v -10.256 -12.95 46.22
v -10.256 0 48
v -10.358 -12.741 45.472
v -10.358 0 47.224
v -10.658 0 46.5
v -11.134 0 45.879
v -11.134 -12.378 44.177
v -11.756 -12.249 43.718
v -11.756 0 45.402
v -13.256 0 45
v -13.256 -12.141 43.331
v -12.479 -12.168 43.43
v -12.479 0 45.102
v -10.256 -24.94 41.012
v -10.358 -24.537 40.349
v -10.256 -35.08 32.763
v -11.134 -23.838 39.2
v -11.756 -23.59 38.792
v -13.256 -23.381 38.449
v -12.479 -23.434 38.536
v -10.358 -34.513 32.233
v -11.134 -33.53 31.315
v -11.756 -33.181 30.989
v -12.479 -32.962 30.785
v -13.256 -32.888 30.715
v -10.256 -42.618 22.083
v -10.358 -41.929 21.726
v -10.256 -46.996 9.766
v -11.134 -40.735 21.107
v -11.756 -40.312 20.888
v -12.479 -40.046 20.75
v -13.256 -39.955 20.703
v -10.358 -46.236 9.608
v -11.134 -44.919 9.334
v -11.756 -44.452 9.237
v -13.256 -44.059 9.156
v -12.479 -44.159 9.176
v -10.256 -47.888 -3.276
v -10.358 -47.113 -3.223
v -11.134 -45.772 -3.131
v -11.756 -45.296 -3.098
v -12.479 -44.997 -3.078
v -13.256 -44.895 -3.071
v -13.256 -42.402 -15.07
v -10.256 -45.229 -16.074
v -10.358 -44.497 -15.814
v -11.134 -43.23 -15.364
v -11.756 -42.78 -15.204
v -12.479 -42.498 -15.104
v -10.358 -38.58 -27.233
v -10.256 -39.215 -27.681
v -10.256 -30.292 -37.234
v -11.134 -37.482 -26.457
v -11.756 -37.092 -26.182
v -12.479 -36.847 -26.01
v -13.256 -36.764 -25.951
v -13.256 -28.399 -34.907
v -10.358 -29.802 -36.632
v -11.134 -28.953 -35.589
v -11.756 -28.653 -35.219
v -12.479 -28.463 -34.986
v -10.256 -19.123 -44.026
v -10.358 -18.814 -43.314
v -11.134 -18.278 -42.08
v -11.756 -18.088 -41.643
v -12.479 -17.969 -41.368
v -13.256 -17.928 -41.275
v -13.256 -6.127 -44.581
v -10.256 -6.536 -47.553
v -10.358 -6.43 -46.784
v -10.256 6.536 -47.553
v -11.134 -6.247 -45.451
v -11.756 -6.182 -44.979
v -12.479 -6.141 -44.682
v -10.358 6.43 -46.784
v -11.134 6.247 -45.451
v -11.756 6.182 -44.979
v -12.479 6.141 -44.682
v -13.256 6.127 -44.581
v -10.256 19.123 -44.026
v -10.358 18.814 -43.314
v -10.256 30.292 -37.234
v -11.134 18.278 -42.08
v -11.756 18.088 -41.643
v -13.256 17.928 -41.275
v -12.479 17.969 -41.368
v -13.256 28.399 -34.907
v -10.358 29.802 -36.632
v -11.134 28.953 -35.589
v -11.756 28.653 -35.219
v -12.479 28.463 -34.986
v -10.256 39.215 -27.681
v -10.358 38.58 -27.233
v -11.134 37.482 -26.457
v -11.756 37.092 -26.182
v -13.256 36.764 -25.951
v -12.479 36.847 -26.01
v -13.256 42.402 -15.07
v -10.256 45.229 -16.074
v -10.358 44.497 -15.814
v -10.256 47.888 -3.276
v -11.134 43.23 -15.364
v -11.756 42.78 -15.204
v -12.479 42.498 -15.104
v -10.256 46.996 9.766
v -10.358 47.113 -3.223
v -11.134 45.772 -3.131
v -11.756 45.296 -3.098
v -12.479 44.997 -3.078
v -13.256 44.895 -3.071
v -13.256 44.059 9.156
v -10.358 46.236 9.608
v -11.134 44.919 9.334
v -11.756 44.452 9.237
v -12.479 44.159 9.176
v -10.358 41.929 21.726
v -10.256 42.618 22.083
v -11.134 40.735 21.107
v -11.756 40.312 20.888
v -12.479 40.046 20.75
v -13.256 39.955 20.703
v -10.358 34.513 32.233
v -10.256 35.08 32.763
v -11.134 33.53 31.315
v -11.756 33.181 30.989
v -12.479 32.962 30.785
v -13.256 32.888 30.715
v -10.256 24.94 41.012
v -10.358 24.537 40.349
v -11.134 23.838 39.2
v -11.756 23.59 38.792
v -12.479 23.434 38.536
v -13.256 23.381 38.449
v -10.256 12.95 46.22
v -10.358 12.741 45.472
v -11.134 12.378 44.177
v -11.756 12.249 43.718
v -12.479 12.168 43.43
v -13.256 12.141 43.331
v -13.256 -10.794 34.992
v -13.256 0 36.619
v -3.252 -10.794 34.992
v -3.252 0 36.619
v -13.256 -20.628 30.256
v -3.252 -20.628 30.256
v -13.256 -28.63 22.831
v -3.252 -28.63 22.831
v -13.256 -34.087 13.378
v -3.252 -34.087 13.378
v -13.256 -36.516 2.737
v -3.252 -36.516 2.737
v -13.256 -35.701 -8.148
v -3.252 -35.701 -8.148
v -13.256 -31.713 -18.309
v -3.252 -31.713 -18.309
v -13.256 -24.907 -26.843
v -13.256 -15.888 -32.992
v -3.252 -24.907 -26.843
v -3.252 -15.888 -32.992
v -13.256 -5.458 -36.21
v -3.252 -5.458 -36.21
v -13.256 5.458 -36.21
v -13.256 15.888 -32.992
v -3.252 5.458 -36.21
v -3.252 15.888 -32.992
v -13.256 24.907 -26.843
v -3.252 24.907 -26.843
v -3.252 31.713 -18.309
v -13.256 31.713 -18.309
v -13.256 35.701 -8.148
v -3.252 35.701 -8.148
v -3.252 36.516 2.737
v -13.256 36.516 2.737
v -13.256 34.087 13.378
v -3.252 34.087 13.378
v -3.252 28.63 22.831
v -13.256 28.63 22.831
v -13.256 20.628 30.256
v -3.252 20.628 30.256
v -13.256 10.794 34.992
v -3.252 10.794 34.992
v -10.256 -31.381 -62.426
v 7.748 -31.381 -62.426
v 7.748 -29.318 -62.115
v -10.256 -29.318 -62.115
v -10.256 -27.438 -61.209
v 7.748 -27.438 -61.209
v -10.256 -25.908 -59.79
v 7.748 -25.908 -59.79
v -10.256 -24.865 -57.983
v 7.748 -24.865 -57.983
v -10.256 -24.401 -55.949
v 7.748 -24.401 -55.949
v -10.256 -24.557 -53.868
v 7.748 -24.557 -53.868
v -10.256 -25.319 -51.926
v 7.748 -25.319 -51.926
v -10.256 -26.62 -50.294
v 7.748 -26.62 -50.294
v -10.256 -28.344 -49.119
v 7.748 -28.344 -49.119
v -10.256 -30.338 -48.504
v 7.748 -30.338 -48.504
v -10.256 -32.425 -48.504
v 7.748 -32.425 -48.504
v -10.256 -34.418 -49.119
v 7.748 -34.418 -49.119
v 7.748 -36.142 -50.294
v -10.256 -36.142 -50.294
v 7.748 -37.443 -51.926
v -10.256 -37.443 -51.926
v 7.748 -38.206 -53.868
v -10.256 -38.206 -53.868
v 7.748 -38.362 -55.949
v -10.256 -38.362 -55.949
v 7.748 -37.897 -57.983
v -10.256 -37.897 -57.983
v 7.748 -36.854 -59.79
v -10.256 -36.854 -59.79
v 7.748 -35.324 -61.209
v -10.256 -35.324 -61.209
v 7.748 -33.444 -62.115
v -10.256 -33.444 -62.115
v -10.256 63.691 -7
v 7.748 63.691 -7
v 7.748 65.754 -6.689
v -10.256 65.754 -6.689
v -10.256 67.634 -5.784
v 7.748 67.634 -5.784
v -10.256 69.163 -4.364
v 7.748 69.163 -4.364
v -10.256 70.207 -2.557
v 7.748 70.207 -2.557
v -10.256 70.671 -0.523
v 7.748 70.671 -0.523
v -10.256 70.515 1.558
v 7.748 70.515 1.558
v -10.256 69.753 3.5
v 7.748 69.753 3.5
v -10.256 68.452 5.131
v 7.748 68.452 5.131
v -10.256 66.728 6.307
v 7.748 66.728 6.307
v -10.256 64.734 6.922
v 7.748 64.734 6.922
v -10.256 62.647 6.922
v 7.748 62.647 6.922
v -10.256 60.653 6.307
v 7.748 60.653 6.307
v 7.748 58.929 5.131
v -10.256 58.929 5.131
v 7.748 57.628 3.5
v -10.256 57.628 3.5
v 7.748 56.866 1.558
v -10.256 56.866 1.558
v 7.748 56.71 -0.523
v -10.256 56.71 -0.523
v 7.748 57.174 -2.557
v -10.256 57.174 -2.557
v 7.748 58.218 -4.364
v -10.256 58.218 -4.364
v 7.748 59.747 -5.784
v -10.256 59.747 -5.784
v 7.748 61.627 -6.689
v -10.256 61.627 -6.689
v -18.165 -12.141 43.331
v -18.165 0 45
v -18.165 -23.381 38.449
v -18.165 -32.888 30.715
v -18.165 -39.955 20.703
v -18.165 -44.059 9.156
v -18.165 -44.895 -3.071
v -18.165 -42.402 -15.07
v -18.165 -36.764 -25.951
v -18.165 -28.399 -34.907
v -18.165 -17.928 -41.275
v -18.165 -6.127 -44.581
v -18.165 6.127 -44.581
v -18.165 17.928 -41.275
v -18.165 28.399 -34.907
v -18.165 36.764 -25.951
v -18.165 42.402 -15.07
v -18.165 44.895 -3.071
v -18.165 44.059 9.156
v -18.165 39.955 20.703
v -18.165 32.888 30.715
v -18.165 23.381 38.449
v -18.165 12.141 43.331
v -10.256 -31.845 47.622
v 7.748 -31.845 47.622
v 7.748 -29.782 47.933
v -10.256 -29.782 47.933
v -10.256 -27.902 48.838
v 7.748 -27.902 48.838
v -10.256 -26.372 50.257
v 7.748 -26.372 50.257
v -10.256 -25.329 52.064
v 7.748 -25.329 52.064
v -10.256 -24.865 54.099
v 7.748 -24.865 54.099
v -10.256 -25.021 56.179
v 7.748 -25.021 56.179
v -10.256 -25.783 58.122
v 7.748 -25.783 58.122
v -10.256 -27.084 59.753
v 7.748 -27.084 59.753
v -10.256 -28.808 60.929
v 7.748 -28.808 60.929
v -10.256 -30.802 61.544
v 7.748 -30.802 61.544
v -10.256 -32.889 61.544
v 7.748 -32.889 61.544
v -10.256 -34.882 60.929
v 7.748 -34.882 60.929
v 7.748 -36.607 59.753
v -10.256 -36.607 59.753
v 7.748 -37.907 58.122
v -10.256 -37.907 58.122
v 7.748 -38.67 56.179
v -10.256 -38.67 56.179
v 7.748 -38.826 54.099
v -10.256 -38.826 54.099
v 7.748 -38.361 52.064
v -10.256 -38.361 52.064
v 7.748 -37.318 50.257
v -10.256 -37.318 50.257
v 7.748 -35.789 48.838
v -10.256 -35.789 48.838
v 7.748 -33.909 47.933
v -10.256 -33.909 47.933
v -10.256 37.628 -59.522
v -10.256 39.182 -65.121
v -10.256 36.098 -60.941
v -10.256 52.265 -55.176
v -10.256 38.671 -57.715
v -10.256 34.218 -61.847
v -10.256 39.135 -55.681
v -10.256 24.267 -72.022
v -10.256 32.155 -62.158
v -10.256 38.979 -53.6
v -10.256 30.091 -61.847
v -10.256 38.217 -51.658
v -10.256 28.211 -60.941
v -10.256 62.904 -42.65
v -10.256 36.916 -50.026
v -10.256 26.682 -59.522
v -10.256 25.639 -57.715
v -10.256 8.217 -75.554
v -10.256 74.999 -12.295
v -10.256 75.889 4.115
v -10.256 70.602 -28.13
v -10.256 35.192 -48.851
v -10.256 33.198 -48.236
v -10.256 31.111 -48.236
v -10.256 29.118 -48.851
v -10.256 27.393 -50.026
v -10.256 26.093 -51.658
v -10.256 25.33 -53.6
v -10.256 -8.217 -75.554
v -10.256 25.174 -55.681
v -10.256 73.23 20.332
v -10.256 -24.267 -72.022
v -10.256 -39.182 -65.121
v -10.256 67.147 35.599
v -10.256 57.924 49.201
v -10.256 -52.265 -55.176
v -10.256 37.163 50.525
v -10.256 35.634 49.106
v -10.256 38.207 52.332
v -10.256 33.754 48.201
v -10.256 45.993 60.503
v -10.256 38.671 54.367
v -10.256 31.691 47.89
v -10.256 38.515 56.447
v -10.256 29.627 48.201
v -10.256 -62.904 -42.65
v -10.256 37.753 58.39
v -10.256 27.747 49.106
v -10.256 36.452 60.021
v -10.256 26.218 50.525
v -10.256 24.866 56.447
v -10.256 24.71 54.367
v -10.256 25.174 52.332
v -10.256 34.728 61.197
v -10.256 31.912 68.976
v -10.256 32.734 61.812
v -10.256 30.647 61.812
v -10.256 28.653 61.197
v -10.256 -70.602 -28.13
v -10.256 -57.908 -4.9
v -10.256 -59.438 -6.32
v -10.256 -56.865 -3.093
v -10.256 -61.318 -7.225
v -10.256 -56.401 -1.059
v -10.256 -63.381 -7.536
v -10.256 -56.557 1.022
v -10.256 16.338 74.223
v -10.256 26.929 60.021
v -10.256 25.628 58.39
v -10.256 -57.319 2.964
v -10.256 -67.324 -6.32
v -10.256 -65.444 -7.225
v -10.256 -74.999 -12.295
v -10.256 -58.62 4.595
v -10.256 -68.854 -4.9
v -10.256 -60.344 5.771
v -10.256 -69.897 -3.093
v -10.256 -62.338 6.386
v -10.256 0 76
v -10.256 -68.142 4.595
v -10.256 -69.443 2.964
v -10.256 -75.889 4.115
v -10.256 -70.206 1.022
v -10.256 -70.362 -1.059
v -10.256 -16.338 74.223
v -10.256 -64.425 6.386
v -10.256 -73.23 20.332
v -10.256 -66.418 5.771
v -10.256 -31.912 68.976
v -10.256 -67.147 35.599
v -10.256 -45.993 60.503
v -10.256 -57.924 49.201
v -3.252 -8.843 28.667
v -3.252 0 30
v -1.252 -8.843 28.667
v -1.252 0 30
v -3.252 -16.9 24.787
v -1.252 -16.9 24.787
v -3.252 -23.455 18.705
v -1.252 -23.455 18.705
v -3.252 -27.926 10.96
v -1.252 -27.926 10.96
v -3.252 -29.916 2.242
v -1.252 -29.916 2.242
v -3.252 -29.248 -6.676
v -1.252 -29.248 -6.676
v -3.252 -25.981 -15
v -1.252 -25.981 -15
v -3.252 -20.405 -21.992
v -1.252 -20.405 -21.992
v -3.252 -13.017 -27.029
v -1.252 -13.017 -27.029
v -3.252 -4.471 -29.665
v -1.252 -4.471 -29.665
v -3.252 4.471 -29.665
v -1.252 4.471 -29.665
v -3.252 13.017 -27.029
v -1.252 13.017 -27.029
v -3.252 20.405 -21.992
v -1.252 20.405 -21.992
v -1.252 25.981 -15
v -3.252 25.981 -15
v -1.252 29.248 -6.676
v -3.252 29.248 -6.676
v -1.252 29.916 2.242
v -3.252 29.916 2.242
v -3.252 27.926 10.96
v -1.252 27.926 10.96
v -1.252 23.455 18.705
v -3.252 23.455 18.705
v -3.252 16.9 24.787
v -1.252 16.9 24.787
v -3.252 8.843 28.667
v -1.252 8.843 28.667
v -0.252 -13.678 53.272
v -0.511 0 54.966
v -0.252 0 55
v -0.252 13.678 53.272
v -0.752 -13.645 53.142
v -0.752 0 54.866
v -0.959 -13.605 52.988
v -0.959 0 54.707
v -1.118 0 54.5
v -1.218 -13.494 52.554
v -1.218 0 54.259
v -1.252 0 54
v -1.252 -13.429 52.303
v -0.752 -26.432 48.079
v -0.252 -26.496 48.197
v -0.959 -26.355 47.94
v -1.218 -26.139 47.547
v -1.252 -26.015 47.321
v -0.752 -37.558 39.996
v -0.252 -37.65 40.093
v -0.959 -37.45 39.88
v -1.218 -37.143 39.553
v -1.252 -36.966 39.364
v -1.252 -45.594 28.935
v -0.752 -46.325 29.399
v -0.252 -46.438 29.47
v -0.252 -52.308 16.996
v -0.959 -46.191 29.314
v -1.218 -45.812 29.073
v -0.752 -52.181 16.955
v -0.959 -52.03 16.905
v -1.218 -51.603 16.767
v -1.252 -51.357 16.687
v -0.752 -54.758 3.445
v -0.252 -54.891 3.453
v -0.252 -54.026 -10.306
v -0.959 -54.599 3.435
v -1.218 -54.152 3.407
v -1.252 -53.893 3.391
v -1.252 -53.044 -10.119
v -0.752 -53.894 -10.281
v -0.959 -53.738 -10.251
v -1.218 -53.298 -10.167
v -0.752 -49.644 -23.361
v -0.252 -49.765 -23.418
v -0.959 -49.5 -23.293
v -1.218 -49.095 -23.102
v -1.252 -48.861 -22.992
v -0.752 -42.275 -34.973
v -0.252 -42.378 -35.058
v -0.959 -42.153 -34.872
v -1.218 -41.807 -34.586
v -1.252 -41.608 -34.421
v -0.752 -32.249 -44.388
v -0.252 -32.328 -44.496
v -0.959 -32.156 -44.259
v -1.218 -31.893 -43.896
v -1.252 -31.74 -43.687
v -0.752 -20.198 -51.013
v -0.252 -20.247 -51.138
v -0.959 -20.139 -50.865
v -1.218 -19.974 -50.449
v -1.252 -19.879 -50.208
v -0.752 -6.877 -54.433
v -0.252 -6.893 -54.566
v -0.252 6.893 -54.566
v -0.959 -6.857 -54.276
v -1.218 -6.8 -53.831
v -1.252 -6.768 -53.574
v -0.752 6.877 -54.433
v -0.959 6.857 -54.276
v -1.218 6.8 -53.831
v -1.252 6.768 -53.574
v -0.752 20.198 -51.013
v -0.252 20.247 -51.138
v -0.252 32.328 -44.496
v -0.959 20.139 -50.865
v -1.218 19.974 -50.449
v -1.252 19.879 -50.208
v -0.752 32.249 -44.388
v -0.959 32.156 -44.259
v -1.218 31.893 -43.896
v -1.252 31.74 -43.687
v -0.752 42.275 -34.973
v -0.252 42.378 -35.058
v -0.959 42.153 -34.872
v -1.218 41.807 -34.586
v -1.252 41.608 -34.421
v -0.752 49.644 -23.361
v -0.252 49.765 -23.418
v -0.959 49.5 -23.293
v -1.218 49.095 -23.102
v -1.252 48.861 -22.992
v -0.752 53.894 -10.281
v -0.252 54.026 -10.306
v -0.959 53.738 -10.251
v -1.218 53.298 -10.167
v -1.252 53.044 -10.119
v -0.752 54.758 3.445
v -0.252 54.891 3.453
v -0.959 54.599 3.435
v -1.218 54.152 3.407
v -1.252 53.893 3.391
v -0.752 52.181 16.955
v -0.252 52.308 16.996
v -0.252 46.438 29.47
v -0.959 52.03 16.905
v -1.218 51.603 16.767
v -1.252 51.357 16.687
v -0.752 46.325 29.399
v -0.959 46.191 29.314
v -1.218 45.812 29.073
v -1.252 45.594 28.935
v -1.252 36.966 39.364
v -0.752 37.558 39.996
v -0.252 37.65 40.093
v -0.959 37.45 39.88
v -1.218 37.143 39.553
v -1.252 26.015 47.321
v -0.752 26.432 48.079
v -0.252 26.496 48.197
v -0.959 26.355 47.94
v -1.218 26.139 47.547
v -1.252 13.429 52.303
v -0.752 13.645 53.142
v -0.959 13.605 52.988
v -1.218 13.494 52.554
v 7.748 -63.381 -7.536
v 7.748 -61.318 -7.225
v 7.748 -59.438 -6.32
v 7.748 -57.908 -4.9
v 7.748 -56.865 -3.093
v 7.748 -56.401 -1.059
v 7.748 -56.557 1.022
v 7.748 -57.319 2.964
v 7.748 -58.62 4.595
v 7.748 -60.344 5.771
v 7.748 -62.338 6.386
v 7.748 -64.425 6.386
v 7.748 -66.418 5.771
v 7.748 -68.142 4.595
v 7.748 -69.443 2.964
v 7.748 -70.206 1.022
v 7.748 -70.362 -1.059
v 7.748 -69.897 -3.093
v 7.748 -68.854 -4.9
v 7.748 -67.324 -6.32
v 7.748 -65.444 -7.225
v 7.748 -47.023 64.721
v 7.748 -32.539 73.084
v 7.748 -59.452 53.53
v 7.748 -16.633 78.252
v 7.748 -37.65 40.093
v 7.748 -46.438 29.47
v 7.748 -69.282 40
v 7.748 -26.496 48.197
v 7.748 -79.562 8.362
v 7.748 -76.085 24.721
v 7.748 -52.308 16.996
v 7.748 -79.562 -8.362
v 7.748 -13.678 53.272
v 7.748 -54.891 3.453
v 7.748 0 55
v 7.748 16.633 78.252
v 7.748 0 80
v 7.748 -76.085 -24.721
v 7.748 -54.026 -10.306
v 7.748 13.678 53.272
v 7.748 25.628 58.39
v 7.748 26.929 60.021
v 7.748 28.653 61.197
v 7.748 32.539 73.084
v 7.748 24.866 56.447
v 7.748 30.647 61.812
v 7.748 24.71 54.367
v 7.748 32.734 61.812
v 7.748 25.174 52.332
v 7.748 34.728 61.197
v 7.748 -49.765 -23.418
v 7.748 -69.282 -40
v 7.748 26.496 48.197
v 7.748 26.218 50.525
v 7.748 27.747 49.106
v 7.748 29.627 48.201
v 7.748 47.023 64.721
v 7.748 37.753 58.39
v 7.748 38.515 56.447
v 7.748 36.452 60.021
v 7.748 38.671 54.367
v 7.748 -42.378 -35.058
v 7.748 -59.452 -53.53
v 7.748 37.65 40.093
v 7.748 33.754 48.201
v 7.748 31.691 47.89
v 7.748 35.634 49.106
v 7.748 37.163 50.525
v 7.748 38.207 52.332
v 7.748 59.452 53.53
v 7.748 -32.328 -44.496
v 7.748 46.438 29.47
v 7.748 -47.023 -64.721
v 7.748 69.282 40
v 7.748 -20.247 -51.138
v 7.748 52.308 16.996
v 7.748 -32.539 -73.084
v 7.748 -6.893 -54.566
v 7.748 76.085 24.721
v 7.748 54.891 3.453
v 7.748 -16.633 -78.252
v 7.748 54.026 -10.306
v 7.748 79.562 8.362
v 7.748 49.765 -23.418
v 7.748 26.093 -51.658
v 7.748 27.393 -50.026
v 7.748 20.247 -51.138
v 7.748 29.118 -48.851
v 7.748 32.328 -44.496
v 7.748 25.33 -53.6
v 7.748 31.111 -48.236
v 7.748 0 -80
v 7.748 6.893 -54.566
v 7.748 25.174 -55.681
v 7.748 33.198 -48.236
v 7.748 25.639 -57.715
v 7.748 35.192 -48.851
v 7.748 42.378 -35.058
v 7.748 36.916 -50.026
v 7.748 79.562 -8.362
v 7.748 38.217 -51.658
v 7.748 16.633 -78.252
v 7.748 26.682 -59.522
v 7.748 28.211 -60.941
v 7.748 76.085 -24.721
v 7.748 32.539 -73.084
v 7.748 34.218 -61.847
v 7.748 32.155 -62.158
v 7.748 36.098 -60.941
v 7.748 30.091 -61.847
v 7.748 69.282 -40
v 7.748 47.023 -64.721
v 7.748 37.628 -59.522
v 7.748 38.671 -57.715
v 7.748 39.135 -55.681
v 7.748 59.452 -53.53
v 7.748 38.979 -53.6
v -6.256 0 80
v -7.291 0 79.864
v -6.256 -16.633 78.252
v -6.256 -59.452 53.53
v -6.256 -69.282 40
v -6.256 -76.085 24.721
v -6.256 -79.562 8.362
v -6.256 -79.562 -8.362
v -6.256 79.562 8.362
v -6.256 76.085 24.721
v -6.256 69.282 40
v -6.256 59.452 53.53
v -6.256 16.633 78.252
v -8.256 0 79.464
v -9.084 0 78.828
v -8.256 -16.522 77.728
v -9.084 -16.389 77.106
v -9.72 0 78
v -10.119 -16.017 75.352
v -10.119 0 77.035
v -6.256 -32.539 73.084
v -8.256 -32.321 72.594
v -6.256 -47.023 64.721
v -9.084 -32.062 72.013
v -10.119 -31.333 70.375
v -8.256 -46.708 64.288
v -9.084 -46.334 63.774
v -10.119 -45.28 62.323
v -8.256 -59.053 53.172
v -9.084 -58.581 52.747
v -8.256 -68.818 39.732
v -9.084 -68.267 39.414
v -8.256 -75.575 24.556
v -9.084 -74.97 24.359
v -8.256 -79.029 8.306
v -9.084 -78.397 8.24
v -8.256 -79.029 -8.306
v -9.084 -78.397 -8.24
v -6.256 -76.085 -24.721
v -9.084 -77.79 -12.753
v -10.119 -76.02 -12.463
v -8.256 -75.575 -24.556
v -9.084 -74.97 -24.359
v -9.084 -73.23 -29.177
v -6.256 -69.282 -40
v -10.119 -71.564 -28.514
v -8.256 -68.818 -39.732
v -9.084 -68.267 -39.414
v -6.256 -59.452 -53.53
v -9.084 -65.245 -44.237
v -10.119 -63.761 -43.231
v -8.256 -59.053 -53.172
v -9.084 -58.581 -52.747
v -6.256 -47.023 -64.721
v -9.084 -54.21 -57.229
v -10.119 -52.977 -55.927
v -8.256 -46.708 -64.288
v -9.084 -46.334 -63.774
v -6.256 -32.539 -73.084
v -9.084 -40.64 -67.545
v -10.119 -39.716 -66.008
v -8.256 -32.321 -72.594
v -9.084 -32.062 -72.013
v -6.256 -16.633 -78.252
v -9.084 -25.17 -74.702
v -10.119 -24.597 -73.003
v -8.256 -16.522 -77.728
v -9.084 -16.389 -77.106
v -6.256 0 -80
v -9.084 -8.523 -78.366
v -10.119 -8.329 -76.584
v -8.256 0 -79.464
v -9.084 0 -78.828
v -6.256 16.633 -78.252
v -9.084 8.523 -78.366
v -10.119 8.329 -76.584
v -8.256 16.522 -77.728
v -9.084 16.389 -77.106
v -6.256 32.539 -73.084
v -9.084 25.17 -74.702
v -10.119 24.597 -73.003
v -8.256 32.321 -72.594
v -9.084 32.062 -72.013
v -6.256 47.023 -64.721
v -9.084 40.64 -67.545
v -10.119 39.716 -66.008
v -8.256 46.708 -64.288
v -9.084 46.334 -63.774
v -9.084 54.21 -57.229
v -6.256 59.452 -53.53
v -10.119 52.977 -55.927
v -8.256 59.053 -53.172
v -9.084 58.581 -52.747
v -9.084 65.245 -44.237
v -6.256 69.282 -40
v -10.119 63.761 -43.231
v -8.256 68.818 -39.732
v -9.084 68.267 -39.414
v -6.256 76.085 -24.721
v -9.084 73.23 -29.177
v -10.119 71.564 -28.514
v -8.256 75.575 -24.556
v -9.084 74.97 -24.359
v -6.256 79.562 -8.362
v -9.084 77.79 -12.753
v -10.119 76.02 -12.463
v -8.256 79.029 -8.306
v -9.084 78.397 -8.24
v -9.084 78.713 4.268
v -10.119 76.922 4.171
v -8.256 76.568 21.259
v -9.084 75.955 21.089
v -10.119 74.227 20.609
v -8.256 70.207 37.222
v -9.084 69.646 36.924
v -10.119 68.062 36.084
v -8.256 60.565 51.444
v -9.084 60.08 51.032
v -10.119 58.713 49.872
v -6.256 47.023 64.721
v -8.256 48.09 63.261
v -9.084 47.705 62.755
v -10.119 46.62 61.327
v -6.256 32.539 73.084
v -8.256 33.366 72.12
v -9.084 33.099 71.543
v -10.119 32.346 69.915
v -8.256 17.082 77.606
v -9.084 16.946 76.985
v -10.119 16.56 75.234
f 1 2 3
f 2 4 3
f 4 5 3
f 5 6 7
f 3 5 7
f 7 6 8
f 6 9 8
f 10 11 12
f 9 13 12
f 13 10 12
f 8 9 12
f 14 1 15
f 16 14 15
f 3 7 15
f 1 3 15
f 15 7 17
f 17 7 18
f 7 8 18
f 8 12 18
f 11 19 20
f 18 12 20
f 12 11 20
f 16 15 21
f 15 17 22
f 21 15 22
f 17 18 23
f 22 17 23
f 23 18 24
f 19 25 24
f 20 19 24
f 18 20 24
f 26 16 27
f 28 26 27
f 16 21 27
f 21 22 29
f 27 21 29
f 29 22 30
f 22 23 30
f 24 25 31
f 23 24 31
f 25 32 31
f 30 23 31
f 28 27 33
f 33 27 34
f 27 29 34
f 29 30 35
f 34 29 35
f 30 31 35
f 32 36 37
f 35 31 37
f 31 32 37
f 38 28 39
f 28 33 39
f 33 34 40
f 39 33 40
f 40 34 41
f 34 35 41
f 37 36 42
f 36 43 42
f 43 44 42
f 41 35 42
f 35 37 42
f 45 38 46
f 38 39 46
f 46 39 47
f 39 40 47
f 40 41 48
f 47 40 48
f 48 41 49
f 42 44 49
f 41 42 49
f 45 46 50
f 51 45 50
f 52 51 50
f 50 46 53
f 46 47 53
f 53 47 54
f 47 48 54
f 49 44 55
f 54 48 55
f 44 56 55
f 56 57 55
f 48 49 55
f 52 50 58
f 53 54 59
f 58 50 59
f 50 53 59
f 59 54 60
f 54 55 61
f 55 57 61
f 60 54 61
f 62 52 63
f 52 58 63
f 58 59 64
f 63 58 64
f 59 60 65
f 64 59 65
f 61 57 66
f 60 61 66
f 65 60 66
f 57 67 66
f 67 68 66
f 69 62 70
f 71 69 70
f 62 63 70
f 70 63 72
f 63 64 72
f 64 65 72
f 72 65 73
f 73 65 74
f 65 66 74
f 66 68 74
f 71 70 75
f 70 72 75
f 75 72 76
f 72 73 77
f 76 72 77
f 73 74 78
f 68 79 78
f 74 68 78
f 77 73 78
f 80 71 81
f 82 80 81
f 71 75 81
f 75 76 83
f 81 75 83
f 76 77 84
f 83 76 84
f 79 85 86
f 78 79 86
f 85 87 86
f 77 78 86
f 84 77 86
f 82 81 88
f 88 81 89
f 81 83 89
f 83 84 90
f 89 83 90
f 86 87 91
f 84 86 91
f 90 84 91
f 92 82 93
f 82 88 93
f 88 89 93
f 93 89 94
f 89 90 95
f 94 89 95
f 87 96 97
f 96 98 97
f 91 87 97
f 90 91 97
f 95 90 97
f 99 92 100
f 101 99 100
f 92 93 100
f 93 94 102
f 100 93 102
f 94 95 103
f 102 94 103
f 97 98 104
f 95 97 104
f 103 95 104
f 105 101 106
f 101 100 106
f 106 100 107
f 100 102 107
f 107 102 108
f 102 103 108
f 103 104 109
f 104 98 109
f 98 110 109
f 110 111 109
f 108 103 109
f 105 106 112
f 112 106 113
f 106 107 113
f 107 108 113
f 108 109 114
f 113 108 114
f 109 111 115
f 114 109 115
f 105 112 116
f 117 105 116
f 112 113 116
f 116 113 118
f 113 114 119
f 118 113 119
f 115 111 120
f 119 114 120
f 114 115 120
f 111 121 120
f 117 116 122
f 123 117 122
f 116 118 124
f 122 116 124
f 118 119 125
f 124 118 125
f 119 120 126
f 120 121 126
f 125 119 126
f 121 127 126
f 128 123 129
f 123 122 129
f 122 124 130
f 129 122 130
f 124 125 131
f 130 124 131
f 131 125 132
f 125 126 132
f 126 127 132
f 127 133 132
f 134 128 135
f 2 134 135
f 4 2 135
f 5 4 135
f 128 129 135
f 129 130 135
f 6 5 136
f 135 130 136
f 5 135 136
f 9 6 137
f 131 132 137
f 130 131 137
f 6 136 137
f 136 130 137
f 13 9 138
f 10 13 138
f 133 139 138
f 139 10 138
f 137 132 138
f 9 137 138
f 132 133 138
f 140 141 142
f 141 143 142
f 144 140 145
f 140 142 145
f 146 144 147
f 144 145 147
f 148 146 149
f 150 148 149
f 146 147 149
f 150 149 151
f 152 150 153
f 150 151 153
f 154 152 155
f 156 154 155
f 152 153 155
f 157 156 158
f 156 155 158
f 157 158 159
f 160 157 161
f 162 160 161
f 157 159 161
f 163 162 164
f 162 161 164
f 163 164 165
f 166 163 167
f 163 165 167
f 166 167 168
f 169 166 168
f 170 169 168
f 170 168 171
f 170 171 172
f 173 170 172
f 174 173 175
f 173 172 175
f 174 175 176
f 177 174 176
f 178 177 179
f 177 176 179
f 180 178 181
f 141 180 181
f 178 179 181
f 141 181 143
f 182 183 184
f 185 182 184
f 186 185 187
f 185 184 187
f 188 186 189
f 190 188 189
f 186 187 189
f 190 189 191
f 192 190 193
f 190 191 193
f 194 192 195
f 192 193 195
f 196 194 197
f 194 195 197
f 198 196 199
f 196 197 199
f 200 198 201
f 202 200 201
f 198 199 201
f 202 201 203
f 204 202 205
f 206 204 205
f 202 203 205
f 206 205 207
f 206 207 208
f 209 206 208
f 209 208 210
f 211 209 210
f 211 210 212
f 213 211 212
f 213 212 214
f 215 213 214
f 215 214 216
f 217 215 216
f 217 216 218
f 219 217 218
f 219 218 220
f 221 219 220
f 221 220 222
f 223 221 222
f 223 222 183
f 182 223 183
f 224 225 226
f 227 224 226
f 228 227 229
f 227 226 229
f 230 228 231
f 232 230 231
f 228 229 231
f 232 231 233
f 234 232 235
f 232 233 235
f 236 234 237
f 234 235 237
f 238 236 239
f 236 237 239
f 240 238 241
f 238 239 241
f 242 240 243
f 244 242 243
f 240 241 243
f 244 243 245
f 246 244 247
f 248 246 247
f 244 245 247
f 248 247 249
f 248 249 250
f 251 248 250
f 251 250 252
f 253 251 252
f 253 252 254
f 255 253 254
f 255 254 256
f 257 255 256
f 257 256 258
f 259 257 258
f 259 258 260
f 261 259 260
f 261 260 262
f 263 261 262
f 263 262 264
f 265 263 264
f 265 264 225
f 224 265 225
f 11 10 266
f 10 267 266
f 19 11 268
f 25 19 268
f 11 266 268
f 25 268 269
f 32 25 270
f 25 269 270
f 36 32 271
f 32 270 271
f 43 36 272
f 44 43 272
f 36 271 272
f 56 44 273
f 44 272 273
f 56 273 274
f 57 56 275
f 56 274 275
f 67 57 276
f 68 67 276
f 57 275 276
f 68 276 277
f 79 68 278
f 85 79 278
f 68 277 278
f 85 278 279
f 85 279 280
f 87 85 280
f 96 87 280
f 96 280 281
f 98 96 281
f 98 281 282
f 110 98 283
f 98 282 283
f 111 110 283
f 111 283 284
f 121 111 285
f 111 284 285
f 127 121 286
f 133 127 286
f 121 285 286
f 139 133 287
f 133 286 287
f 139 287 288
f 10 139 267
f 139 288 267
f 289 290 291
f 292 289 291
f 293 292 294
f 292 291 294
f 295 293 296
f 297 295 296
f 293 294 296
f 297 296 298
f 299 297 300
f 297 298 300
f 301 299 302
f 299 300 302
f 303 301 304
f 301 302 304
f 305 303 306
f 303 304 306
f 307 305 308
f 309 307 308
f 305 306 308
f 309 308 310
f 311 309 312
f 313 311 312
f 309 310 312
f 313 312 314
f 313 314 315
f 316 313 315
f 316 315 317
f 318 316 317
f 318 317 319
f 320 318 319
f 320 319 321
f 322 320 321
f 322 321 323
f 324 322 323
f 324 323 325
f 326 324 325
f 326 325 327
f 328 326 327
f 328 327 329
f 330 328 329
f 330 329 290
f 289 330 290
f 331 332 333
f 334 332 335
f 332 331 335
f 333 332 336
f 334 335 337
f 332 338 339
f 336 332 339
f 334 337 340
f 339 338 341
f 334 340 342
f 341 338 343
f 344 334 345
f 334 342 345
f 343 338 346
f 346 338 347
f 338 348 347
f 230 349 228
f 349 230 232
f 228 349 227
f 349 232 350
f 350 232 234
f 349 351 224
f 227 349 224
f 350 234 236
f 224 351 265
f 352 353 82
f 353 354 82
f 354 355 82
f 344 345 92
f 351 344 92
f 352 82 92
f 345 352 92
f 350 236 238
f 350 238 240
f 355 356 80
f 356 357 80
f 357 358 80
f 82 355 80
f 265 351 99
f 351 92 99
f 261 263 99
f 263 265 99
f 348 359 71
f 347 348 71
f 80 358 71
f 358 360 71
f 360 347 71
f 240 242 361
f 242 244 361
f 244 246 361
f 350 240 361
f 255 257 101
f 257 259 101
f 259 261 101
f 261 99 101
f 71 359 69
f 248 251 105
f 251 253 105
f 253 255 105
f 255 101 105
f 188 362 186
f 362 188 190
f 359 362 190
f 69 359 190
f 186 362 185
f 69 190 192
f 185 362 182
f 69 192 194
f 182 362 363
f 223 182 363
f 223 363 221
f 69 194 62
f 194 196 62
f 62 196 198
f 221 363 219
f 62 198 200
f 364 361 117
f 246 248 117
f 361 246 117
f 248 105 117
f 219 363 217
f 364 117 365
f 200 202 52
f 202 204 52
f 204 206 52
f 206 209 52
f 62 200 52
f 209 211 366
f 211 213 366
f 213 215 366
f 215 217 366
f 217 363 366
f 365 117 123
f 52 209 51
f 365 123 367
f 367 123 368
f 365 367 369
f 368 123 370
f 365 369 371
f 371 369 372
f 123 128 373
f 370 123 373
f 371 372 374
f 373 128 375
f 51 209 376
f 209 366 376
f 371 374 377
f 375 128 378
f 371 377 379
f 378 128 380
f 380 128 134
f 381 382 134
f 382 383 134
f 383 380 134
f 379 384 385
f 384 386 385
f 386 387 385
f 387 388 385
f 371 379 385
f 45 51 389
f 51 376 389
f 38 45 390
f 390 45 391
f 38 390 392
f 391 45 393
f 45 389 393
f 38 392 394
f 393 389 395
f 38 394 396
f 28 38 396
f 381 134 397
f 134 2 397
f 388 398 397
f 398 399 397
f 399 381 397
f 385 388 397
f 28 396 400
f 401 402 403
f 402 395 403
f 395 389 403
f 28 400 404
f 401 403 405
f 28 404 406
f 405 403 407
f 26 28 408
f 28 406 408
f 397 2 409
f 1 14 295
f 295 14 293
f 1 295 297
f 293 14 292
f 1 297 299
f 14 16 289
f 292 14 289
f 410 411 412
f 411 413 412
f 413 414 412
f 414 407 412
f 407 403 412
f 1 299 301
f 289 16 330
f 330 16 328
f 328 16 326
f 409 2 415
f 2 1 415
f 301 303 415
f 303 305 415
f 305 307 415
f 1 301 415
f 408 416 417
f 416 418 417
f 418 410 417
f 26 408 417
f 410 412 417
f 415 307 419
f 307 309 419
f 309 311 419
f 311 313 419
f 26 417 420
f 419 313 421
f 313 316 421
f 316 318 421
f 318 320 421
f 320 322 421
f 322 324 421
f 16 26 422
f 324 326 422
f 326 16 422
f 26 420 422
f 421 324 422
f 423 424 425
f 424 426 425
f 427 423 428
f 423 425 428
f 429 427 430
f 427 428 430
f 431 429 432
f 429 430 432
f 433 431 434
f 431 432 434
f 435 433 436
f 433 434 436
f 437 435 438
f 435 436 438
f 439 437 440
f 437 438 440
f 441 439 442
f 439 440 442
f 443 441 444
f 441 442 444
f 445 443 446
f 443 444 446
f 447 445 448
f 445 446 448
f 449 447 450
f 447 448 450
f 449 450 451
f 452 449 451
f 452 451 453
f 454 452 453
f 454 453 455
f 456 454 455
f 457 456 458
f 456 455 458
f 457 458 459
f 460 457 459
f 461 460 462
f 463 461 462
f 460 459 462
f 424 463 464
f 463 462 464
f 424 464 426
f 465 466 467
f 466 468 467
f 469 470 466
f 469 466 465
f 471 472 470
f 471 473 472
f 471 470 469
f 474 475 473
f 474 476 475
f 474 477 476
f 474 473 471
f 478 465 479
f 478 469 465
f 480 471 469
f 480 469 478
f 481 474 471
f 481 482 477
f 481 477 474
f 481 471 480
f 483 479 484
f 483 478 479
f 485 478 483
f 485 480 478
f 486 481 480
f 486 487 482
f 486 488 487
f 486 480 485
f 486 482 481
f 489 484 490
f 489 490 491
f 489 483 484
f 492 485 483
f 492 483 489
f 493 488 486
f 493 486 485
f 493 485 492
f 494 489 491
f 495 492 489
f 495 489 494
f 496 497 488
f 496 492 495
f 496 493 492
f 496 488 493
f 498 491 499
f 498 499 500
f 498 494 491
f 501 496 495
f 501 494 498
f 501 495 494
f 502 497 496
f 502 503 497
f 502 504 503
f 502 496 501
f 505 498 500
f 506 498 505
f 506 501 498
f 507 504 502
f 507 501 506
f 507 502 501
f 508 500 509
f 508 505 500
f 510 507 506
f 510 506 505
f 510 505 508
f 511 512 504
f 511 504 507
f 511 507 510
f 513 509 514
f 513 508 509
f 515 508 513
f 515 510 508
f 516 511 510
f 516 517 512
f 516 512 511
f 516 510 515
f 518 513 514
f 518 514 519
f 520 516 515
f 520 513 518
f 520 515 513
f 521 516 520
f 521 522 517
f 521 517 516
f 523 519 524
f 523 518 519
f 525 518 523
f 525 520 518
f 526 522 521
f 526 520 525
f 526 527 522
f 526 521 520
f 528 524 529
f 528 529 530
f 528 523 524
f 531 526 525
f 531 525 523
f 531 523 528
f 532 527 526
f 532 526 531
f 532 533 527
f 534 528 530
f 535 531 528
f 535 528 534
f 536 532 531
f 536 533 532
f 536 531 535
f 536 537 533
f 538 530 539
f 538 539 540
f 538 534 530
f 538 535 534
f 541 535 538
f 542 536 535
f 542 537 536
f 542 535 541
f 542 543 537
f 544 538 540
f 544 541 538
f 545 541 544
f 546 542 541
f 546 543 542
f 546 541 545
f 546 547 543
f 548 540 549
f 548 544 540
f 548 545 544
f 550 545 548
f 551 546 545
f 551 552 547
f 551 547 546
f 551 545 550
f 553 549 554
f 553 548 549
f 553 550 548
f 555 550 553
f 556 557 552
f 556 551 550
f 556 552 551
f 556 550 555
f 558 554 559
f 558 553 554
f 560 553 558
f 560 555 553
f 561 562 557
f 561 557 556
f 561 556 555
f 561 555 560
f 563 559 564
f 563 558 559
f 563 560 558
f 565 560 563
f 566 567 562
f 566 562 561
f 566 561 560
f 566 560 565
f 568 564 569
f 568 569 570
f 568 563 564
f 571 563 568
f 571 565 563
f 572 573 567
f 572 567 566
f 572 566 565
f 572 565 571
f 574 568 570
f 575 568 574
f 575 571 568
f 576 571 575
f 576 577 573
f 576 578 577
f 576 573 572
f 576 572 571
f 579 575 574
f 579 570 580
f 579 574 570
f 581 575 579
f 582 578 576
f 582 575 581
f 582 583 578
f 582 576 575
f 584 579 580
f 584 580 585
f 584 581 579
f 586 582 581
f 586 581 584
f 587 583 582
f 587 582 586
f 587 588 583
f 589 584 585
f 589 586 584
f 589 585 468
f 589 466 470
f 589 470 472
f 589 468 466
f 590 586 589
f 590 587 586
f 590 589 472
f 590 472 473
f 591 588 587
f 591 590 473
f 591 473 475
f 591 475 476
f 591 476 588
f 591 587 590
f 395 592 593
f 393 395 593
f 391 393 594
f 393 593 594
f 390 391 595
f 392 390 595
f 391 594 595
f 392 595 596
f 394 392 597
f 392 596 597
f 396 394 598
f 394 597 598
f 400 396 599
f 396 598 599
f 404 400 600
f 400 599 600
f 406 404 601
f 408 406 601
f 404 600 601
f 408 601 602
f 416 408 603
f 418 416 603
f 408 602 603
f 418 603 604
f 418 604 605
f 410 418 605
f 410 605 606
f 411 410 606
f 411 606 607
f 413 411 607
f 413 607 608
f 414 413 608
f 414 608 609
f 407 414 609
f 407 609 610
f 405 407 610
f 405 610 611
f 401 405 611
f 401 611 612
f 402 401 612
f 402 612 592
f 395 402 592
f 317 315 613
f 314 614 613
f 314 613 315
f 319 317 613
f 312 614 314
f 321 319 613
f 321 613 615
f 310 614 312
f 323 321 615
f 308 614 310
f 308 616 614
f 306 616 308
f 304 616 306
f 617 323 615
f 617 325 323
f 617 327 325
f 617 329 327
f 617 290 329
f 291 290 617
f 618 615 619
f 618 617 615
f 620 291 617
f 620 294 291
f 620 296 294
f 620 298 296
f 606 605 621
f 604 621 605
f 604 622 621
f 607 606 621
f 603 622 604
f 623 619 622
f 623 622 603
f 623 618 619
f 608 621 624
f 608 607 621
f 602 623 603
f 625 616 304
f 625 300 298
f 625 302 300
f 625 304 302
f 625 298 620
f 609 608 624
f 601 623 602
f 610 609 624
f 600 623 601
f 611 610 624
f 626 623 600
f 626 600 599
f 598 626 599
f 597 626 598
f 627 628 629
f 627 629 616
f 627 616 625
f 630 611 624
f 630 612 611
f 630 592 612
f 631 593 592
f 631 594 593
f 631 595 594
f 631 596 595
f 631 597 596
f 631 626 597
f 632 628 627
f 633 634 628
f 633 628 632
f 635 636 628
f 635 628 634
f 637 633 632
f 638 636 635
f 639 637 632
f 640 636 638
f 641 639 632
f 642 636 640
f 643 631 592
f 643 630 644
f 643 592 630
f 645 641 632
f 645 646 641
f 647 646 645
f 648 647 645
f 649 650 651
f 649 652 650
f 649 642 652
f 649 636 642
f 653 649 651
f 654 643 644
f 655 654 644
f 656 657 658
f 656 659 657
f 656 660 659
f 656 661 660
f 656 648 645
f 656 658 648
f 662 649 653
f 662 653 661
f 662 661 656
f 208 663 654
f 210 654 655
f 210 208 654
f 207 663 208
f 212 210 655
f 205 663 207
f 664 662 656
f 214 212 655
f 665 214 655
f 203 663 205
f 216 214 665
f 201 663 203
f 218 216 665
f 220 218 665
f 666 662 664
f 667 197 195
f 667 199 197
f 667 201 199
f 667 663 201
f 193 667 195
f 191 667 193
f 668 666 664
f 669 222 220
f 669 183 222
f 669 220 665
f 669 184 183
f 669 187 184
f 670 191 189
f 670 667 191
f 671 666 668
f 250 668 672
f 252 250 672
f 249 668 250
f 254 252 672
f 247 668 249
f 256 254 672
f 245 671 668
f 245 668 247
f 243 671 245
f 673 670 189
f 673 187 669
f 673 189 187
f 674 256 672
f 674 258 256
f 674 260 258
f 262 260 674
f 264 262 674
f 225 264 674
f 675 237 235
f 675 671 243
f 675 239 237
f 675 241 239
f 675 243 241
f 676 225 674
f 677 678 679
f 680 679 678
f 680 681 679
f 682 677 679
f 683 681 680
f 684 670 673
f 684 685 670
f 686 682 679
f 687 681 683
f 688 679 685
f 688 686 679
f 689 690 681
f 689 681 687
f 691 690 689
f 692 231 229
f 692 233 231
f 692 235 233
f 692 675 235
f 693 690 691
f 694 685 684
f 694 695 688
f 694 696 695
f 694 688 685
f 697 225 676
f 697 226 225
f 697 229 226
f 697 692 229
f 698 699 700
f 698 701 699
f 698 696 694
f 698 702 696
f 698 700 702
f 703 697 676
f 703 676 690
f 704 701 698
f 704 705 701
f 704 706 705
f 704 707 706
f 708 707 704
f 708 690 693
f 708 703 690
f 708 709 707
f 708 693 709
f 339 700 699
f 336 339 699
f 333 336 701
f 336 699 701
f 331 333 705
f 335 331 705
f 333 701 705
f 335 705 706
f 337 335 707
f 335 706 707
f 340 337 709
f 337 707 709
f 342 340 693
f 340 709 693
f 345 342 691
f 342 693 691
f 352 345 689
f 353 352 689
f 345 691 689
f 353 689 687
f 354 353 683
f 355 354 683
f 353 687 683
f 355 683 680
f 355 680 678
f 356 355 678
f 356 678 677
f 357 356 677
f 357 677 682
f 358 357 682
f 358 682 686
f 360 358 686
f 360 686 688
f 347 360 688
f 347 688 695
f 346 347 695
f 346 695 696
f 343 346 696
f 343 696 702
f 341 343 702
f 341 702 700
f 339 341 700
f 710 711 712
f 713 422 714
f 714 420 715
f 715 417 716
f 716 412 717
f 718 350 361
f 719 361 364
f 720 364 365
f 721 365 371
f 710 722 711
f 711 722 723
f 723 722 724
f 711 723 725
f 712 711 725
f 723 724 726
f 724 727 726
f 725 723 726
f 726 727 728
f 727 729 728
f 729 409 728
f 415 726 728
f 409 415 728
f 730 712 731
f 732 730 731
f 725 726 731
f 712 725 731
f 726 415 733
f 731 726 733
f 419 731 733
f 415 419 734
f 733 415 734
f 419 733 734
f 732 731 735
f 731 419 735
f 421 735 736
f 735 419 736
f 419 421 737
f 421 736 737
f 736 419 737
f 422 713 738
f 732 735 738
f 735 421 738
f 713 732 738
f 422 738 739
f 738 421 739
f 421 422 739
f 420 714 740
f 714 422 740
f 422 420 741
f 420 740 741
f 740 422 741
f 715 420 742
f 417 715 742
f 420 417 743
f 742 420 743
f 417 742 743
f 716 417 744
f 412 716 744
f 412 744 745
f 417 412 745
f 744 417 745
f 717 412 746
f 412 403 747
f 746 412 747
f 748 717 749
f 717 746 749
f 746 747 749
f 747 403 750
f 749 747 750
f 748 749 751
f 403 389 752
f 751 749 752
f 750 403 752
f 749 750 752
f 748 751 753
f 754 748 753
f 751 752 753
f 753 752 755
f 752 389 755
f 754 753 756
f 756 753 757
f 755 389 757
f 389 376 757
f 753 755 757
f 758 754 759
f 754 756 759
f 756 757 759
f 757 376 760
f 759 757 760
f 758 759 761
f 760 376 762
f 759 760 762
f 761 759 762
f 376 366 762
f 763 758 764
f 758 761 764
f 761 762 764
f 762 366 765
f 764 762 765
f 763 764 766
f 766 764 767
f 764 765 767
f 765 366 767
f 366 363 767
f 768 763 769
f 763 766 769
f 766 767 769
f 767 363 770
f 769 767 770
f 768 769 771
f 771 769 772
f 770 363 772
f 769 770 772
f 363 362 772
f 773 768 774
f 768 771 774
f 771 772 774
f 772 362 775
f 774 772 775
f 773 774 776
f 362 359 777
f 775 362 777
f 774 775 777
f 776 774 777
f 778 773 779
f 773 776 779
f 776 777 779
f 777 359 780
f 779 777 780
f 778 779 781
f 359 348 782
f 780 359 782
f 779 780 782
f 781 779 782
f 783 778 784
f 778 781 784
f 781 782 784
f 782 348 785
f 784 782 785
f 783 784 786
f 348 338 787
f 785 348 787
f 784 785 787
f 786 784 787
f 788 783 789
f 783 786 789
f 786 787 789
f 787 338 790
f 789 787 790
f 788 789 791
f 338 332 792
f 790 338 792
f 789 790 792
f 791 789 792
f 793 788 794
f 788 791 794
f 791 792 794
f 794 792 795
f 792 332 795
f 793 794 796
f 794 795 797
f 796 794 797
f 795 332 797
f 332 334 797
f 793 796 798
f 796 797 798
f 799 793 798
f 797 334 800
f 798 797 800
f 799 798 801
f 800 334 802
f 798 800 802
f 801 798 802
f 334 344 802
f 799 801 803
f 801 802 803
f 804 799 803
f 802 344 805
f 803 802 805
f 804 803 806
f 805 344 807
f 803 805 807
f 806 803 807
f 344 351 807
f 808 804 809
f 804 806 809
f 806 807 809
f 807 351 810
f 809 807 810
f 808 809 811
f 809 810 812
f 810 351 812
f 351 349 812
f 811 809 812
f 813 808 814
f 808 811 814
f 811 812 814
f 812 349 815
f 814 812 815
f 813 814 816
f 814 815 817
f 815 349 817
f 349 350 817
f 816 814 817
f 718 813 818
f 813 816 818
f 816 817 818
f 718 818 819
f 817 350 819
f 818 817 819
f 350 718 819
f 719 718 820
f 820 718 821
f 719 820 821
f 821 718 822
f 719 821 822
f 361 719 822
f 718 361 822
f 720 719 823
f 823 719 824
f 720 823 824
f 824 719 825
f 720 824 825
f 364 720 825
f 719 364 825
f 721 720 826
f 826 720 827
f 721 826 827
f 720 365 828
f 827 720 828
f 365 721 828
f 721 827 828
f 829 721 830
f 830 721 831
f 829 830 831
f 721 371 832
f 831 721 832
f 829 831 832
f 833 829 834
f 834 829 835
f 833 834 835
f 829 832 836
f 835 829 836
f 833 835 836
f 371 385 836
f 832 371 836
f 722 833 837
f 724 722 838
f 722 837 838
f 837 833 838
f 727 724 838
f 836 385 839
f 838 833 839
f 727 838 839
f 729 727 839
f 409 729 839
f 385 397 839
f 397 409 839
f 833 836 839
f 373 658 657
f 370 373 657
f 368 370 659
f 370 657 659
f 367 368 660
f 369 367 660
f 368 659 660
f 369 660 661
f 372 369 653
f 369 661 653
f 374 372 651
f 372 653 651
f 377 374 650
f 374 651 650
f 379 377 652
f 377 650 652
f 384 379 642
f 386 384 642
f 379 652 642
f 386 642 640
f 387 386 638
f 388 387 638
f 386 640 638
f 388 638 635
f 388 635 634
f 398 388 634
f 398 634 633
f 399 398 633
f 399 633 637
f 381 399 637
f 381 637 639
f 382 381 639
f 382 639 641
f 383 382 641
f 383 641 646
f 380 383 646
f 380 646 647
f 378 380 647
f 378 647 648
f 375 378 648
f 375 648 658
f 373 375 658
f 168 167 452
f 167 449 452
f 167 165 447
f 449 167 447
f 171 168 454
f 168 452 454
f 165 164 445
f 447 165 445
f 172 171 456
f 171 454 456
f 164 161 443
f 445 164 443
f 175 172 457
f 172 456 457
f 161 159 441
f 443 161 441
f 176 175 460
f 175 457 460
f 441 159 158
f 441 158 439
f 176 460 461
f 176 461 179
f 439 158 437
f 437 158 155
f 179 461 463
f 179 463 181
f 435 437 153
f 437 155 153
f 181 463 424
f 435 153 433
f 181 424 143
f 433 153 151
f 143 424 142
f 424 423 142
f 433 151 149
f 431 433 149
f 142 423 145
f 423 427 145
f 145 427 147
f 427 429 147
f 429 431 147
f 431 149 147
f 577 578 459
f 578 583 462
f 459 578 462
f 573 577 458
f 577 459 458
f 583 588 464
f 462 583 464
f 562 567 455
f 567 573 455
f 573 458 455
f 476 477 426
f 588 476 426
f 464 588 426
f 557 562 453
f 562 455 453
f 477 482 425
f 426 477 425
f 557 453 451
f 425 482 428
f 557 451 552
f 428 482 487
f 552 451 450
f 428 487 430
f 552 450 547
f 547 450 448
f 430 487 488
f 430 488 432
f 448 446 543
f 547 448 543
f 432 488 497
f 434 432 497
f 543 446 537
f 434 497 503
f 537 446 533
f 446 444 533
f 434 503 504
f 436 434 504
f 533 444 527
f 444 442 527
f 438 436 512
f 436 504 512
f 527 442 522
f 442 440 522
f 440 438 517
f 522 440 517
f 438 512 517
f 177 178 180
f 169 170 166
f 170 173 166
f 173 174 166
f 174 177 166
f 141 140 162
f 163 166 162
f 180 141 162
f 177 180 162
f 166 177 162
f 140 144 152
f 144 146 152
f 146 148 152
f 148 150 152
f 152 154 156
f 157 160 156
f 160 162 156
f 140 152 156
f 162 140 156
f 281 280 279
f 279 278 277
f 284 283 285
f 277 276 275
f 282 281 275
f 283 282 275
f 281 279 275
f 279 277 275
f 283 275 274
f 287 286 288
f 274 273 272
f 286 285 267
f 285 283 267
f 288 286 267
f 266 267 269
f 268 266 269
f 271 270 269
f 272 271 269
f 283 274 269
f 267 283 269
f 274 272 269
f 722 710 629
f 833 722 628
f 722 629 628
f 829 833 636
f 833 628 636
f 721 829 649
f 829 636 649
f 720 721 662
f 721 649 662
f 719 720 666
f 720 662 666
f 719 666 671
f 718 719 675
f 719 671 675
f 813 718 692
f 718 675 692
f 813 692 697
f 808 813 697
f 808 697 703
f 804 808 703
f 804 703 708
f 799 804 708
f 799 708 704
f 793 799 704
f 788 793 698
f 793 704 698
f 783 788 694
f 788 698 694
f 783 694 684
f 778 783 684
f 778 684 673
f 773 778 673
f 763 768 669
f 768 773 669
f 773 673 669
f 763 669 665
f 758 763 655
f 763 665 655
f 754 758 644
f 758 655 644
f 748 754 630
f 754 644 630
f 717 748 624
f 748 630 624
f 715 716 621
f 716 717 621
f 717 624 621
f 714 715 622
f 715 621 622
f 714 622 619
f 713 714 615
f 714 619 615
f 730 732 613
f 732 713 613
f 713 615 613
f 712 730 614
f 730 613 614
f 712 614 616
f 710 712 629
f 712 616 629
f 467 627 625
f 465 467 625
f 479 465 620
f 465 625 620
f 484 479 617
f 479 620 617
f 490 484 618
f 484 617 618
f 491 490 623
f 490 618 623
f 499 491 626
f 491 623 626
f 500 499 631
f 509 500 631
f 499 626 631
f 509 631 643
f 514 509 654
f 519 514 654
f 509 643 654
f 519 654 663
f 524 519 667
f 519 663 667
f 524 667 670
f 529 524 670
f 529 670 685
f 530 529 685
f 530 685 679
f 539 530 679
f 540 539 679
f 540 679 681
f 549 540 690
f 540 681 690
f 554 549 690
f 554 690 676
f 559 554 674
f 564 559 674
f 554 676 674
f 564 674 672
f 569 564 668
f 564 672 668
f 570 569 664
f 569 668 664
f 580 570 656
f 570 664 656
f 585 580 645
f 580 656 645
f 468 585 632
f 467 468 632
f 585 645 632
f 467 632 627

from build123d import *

# Parameters (mm, degrees)
SKETCH2_W              = 14.003667681
SKETCH2_H              = 20
M16X2_0_TAPPED_HOLE1_D = 14
FILLET4_R              = 4
FILLET5_R              = 1


with BuildPart() as part:
    # Sketch1 → Revolve1 (revolve)
    with BuildSketch(Plane(origin=(0, 0, 0), x_dir=(1, 0, 0), z_dir=(0, 1, 0)), mode=Mode.PRIVATE) as revolve1_sk:
        with BuildLine():
            Line((-3.251971734, 30), (-1.251971734, 30))
            Line((-1.251971734, 30), (-1.251971734, 55))
            Line((-1.251971734, 55), (7.748028266, 55))
            Line((7.748028266, 55), (7.748028266, 60))
            Line((7.748028266, 60), (-6.255639415, 60))
            Line((-6.255639415, 60), (-6.255639415, 80))
            Line((-6.255639415, 80), (-10.255639415, 80))
            Line((-10.255639415, 80), (-10.255639415, 48))
            ThreePointArc((-10.255639415, 48), (-11.134319072, 45.878679656), (-13.255639415, 45))
            Line((-13.255639415, 45), (-18.165214358, 45))
            Line((-18.165214358, 45), (-18.165214358, 0))
            Line((-18.165214358, 0), (-13.255639415, 0))
            Line((-13.255639415, 0), (-13.255639415, 36.618791205))
            Line((-13.255639415, 36.618791205), (-3.251971734, 36.618791205))
            Line((-3.251971734, 36.618791205), (-3.251971734, 30))
        make_face()
    revolve(revolve1_sk.sketch.rotate(Axis((0, 0, 0), (1, 0, 0)), 180), axis=Axis((0, 0, 0), (1, 0, 0)))

    # Sketch2 → Revolve2 (revolve)
    with BuildSketch(Plane(origin=(0, 0, 0), x_dir=(1, 0, 0), z_dir=(0, 1, 0)), mode=Mode.PRIVATE) as revolve2_sk:
        with Locations((0.746194426, 70)):
            Rectangle(SKETCH2_W, SKETCH2_H)
    revolve(revolve2_sk.sketch.rotate(Axis((0, 0, 0), (-1, 0, 0)), 180), axis=Axis((0, 0, 0), (-1, 0, 0)))

    # M16x2.0 Tapped Hole1 (through all)
    with Locations(Plane.ZY.offset(10.255639415)):
        with Locations((0, 63.690604398), (54.889736939, 31.690604398), (54.621792488, -31.845302199), (-0.535888903, -63.381208795), (-55.425625842, -31.381208795), (-55.157681391, 32.154697801)):
            Hole(M16X2_0_TAPPED_HOLE1_D / 2)

    # Fillet4
    fillet4_edges = [part.edges().sort_by_distance(p)[0] for p in [
        (-10.255639415, 0, -80),
    ]]
    fillet(fillet4_edges, radius=FILLET4_R)

    # Fillet5
    fillet5_edges = [part.edges().sort_by_distance(p)[0] for p in [
        (-1.251971734, 0, -55),
    ]]
    fillet(fillet5_edges, radius=FILLET5_R)


solid = part.part
